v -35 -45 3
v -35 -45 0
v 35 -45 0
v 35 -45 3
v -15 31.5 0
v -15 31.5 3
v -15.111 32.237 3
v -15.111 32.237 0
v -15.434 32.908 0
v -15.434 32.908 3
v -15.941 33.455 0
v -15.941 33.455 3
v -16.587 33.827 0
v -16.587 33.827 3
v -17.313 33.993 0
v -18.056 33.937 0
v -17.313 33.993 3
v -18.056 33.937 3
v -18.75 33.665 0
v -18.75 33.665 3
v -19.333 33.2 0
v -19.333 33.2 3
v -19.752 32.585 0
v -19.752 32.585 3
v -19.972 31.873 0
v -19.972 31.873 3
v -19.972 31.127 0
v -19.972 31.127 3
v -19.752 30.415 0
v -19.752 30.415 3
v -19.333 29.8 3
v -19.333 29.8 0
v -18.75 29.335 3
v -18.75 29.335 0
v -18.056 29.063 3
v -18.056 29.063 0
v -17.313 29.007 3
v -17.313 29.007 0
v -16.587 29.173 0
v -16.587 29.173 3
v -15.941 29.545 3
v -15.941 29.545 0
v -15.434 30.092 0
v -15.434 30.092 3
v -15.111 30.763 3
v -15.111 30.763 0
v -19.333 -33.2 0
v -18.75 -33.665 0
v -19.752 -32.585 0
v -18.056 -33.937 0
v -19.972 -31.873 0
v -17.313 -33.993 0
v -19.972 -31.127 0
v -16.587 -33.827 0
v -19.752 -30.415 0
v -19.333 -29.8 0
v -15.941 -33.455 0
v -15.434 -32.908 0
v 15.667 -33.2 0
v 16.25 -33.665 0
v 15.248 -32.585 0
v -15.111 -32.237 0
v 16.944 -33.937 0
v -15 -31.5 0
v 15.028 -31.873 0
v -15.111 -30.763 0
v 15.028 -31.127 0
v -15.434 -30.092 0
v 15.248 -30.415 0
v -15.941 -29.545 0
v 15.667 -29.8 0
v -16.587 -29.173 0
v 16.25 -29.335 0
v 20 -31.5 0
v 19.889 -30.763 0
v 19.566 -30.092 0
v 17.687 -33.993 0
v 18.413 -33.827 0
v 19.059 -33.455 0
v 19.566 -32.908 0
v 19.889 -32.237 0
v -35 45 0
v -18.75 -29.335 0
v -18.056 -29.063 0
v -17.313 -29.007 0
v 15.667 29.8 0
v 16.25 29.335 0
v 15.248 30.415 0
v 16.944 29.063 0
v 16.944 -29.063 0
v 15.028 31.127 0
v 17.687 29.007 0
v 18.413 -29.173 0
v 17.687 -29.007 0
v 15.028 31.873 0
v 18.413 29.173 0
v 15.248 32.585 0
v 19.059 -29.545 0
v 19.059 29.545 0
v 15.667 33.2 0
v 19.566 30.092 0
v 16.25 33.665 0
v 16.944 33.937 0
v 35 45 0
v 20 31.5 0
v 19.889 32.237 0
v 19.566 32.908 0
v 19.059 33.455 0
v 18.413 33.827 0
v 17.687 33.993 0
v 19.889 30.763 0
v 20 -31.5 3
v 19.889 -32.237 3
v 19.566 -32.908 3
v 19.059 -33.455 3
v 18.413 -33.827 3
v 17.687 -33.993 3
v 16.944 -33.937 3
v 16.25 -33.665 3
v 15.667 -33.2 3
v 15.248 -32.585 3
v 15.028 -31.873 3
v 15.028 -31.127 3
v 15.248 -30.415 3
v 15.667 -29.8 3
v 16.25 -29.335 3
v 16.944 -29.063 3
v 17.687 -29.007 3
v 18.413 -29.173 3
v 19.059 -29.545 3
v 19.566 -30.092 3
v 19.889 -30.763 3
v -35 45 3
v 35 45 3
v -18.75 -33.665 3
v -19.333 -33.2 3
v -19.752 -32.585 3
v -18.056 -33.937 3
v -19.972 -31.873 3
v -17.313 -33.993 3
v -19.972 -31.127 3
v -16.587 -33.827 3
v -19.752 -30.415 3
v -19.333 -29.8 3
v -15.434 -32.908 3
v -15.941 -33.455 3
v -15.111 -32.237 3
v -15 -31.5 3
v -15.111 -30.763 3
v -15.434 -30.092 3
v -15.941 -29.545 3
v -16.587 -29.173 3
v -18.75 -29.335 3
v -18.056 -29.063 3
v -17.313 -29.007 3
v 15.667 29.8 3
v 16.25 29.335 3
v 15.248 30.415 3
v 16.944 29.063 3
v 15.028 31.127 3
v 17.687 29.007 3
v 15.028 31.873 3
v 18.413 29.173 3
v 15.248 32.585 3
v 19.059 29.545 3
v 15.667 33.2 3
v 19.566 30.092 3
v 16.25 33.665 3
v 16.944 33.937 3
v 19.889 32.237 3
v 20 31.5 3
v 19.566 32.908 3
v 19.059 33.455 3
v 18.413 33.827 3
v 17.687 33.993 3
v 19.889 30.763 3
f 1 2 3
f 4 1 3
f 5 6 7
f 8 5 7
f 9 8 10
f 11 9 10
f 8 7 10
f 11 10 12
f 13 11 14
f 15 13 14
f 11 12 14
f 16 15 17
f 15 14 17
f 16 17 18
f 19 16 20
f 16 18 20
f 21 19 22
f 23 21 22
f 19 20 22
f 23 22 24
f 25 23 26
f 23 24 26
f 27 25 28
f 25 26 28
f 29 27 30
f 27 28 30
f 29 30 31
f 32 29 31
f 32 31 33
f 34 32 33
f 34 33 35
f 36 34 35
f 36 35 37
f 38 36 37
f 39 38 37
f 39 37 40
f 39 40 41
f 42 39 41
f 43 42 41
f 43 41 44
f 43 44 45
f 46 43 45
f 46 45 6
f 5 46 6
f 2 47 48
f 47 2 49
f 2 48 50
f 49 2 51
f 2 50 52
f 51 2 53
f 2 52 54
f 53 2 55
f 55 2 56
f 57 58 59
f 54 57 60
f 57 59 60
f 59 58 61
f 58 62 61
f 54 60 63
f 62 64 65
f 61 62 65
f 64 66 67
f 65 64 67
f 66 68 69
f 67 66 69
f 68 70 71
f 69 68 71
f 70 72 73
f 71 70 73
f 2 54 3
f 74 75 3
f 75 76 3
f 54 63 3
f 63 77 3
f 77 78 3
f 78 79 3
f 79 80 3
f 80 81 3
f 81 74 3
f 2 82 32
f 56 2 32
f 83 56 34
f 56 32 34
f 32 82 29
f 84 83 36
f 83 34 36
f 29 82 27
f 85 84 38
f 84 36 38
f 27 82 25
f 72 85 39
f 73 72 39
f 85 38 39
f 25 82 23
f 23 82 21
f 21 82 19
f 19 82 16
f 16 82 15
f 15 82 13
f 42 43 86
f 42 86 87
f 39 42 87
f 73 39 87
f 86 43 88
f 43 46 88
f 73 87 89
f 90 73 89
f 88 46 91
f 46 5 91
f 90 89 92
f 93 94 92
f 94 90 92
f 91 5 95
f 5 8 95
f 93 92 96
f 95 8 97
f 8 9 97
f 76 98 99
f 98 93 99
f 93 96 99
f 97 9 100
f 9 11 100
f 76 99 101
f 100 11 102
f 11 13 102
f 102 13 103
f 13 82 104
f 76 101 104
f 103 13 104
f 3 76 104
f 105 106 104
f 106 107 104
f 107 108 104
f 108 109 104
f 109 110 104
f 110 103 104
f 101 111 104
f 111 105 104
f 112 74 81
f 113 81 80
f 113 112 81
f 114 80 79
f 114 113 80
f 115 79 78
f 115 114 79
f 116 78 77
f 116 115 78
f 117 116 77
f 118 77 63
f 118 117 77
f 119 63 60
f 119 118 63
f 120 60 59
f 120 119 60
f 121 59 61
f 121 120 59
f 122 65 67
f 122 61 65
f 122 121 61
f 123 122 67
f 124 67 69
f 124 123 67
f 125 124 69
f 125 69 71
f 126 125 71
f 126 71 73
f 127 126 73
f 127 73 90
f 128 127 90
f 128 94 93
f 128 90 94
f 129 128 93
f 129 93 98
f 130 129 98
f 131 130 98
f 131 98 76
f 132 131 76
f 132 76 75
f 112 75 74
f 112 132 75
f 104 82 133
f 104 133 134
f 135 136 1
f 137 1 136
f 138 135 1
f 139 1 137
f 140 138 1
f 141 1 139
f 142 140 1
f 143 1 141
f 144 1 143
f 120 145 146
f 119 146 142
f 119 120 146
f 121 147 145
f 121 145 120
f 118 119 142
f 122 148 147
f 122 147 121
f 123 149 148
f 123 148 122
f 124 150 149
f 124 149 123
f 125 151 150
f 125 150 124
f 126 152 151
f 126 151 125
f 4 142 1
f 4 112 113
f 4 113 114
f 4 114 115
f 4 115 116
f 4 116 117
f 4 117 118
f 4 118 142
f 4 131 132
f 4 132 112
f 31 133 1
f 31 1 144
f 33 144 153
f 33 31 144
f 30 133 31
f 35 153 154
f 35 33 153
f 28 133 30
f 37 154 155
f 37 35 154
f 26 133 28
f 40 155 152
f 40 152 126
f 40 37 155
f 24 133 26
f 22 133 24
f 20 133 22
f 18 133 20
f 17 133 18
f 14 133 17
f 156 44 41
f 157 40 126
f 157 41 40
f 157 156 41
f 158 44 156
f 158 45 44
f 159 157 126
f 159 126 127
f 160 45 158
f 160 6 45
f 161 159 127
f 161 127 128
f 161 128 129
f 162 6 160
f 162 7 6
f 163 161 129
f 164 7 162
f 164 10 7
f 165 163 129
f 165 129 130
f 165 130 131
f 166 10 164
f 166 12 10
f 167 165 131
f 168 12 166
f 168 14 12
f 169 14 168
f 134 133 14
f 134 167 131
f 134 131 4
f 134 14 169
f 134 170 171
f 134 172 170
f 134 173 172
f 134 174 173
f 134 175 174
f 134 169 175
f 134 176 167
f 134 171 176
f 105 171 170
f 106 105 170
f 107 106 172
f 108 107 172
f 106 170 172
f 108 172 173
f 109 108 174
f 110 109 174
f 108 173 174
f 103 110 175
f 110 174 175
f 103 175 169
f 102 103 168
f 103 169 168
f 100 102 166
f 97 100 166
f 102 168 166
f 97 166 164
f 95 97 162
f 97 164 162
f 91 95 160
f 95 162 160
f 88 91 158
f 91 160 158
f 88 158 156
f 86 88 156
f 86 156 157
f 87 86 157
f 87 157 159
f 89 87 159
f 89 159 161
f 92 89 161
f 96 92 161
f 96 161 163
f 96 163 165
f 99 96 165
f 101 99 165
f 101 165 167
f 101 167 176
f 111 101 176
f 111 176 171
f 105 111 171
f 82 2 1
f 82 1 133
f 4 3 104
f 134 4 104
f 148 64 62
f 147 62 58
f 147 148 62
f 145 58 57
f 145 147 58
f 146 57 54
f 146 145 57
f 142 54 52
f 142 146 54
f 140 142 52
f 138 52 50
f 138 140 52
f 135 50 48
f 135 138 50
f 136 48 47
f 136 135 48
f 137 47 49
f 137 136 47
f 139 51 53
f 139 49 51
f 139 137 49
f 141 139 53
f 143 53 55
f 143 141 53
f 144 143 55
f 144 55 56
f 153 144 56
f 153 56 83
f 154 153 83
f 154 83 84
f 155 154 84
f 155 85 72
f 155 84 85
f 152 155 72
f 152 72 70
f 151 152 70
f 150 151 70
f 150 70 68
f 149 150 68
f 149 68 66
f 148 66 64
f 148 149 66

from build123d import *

# Parameters (mm, degrees)
SKETCH1_W           = 70
SKETCH1_H           = 90
BOSS_EXTRUDE1_DEPTH = 3
SKETCH2_R           = 2.5
CUT_EXTRUDE1_DEPTH  = 58.087651905


with BuildPart() as part:
    # Sketch1 → Boss-Extrude1 (new body)
    with BuildSketch(Plane.XY):
        Rectangle(SKETCH1_W, SKETCH1_H)
    extrude(amount=BOSS_EXTRUDE1_DEPTH)

    # Sketch2 → Cut-Extrude1 (cut, through all)
    with BuildSketch(Plane.XY.offset(3)):
        with Locations((-17.5, 31.5)):
            Circle(SKETCH2_R)
        with Locations((17.5, 31.5)):
            Circle(SKETCH2_R)
    cut_extrude1 = extrude(amount=-CUT_EXTRUDE1_DEPTH, mode=Mode.SUBTRACT)

    # Mirror1: Cut-Extrude1 across plane
    add(cut_extrude1.mirror(Plane.ZX), mode=Mode.SUBTRACT)


solid = part.part
